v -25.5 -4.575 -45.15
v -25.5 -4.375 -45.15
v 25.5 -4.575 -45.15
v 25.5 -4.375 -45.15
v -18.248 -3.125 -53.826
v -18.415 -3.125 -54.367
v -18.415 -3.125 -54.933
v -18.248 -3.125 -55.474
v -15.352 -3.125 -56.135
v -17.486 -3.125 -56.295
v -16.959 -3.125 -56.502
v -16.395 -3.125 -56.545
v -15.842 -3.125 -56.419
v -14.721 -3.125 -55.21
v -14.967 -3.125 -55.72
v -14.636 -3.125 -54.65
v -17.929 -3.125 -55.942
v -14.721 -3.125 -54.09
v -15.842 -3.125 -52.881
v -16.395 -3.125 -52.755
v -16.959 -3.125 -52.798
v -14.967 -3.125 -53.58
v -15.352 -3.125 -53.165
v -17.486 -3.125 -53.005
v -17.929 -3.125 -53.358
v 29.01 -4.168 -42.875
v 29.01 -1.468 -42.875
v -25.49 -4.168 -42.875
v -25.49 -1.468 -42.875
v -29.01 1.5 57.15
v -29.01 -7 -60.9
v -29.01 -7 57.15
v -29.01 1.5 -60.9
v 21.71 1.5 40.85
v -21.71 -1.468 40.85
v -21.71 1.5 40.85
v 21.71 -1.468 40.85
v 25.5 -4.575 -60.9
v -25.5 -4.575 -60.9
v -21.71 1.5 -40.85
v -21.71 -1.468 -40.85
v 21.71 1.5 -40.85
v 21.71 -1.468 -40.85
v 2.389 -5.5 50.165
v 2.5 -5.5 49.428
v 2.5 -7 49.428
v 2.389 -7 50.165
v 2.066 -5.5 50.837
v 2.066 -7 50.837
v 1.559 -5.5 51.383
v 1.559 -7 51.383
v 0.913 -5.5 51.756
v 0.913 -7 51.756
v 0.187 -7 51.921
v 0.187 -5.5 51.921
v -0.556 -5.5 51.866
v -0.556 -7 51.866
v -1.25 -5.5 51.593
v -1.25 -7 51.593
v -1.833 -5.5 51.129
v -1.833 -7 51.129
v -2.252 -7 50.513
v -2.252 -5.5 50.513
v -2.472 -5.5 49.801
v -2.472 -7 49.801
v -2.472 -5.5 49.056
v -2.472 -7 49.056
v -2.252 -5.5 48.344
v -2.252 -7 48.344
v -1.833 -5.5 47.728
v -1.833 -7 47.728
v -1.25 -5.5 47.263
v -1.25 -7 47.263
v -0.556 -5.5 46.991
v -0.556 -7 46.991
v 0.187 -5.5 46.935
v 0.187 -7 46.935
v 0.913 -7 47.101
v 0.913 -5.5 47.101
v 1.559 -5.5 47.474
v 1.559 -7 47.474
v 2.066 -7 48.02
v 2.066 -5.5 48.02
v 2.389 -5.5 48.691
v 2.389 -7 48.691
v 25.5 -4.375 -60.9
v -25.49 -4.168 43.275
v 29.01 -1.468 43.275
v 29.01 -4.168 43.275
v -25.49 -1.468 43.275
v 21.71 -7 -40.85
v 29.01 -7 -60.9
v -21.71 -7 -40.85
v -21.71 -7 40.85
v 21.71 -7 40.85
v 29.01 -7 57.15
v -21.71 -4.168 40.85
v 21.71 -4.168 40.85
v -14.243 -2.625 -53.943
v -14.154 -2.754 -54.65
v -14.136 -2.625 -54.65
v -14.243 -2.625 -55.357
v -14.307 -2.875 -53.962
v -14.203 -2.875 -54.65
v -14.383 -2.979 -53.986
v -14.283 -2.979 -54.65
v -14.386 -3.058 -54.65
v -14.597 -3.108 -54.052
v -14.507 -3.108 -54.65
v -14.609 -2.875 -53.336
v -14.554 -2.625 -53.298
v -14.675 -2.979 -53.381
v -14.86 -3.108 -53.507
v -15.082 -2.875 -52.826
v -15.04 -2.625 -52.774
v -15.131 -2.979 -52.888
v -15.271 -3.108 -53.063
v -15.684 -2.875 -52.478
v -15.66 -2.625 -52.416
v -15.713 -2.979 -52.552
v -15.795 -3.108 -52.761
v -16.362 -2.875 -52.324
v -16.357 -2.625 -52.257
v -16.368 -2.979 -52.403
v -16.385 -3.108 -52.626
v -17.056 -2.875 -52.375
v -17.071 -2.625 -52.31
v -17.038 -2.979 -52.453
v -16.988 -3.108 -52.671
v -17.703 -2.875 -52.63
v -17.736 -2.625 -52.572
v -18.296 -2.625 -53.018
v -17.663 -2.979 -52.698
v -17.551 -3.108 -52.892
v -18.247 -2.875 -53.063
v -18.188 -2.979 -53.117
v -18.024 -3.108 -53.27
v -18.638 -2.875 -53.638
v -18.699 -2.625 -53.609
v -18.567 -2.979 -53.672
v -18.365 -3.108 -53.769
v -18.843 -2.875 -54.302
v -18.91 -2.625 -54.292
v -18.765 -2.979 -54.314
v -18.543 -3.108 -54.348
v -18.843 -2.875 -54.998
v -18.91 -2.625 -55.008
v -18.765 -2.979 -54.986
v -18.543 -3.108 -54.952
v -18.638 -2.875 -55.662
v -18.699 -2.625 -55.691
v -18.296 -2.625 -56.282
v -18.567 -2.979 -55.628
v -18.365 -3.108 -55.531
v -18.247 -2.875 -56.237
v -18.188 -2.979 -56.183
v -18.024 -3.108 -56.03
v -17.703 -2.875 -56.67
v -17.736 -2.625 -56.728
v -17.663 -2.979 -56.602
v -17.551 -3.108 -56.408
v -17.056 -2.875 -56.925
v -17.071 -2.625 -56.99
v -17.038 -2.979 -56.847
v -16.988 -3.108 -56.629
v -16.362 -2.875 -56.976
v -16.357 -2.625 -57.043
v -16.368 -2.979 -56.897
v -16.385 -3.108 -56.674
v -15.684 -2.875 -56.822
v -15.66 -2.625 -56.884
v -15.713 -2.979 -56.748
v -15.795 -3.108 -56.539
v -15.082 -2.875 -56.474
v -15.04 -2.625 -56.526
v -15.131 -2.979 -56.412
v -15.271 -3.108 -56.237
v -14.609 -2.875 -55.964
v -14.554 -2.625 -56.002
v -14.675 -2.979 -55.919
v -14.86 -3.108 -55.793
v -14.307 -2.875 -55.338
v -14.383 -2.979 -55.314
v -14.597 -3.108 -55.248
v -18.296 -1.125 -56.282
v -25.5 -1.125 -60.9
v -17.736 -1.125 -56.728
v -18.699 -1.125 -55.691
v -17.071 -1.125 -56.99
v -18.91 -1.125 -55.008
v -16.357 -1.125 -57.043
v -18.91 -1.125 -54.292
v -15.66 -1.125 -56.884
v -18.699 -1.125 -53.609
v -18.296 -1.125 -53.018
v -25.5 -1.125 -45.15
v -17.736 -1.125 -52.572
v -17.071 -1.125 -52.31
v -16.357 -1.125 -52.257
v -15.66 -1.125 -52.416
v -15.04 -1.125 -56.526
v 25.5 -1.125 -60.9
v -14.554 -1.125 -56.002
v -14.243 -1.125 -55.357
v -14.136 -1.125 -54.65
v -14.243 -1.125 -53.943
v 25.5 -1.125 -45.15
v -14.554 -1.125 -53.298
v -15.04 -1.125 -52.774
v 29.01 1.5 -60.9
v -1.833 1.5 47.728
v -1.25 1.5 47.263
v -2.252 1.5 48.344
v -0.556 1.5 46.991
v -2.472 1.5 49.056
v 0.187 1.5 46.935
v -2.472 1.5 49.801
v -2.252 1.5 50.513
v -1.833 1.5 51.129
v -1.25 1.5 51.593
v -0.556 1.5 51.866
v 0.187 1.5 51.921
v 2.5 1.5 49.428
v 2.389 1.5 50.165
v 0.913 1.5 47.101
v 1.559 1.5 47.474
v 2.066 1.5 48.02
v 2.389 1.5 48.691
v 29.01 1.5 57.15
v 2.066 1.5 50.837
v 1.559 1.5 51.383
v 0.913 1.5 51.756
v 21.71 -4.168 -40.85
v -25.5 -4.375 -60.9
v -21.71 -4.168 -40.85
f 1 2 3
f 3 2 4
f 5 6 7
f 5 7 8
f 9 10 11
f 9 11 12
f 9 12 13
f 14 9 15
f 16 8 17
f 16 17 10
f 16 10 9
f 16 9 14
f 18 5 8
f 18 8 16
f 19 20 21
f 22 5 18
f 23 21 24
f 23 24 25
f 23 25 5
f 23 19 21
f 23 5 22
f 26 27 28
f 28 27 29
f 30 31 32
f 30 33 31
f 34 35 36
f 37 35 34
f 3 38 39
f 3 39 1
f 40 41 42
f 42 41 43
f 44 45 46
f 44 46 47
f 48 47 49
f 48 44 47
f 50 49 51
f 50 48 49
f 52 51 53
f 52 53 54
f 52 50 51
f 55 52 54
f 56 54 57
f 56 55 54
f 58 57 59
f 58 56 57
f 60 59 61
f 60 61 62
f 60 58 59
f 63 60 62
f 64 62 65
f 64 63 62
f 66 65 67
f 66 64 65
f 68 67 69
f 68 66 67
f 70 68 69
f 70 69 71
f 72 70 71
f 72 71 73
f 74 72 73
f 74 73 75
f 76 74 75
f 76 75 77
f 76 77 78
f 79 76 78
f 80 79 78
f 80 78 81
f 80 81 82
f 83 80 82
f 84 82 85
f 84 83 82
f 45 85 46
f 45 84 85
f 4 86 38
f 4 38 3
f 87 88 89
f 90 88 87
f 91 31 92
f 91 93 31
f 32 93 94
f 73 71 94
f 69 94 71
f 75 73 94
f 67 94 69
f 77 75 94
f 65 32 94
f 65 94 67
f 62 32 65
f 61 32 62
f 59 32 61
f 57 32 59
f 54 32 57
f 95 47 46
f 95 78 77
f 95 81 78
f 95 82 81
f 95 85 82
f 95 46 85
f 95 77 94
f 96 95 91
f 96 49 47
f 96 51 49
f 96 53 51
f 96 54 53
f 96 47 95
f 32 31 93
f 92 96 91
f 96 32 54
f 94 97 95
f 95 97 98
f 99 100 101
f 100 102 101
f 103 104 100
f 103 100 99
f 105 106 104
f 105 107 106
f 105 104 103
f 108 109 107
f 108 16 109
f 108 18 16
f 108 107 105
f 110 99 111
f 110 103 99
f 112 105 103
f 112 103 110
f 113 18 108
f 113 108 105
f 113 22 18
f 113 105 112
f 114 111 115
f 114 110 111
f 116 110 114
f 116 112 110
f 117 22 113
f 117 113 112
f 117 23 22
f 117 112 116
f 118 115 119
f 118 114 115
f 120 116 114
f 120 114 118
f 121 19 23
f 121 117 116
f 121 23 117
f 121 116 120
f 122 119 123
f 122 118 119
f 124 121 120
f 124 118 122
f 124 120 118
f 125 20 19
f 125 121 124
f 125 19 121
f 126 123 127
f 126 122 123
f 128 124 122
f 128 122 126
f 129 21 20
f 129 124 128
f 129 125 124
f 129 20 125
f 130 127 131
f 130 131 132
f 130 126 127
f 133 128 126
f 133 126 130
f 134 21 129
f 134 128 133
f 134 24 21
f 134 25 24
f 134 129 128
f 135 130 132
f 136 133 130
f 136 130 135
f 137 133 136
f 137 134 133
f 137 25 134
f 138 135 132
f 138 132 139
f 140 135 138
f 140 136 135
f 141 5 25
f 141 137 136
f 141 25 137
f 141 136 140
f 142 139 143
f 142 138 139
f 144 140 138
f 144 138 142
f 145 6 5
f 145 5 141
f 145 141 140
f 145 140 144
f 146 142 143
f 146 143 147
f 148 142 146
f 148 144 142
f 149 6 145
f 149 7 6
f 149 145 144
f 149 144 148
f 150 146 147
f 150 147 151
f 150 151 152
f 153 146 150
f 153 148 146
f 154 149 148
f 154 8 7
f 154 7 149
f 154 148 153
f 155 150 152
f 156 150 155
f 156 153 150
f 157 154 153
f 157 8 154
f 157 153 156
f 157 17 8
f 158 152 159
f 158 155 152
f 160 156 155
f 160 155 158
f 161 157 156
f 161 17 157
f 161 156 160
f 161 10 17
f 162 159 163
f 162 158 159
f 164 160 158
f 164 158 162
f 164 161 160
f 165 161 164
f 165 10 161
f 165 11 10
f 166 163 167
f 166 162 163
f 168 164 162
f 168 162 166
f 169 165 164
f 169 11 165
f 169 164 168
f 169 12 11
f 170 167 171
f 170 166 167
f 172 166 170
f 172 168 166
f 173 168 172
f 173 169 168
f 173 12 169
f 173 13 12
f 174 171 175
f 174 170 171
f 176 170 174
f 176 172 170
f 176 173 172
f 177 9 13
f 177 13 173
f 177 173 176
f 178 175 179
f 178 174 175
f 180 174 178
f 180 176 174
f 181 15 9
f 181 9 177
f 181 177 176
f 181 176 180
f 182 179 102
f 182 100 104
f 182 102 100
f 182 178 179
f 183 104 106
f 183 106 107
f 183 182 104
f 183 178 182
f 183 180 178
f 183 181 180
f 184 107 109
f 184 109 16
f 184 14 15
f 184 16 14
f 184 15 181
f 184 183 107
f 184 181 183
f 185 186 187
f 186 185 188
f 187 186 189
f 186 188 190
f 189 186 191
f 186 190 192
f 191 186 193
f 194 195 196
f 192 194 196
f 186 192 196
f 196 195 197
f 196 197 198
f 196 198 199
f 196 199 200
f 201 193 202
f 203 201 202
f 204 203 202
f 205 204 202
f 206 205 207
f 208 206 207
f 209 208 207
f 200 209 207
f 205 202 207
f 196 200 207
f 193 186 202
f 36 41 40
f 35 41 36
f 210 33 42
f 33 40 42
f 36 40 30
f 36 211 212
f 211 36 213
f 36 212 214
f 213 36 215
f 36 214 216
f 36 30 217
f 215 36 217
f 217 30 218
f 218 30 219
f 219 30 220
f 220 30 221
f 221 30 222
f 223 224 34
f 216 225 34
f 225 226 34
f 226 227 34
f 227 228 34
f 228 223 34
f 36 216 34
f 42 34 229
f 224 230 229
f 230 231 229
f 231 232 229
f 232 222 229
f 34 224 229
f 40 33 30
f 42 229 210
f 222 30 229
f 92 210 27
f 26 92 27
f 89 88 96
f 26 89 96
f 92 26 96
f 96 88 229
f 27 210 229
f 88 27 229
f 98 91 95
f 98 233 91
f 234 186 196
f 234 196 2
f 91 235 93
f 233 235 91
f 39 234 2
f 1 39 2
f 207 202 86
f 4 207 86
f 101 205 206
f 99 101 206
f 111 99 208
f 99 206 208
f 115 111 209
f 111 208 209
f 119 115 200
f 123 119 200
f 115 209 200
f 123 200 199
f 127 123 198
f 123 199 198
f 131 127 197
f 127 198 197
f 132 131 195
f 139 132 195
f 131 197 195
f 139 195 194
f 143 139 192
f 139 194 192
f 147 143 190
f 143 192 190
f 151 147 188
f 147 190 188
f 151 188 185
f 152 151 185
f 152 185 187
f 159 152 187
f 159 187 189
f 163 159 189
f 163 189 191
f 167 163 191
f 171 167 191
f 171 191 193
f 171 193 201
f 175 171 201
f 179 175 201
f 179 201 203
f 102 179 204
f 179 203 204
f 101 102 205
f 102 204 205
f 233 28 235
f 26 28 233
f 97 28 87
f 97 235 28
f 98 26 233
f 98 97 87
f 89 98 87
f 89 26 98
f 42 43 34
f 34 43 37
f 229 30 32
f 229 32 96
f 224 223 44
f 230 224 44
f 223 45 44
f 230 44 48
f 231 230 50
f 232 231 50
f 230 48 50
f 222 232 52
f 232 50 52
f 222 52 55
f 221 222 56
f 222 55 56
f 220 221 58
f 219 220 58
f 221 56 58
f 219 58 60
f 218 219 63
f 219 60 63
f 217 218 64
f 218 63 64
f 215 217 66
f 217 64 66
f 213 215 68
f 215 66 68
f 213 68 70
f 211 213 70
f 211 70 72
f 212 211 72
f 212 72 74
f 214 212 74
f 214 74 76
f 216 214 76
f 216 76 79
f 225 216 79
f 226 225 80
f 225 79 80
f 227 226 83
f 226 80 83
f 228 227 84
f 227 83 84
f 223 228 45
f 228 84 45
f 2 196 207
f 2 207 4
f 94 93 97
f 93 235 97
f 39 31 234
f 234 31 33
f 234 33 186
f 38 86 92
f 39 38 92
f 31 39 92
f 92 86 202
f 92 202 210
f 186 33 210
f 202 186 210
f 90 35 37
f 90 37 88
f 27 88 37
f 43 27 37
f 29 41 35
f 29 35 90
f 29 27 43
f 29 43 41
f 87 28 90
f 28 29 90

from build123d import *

# Parameters (mm, degrees)
F0_W      = 58.02
F0_H      = 96.3
F1_DEPTH  = 5.5
F2_W      = 43.42
F2_H      = 81.7
F3_DEPTH  = 5.501
F4_W      = 2.4
F4_H      = 85.75
F5_DEPTH  = 54.5
F6_DEPTH  = 9
F7_R      = 2.5
F8_DEPTH  = 5.501
F9_DEPTH  = 16
F10_W     = 47
F10_H     = 3.25
F11_DEPTH = 19
F13_DEPTH = 0.4
F14_DEPTH = 3.25
F15_DEPTH = 2
F16_DEPTH = 2
F12_R     = 2.4
F17_DEPTH = 2
F18_R     = 0.5
F19_DEPTH = 0.3
F20_DEPTH = 1.5
F21_DEPTH = 1.5
F22_DEPTH = 0.2


with BuildPart() as f1:
    # F0 (on Front) → F1 (new body)
    with BuildSketch(Plane.XZ):
        Rectangle(F0_W, F0_H)
    extrude(amount=F1_DEPTH)

    # F2 (on face) → F3 (cut, through all)
    with BuildSketch(Plane.XZ.offset(5.5)):
        Rectangle(F2_W, F2_H)
    extrude(amount=-F3_DEPTH, mode=Mode.SUBTRACT)

    # F4 (on face) → F5 (cut)
    with BuildSketch(Plane.YZ.offset(29.01)):
        with Locations((-2.6675368889, 0)):
            Rectangle(F4_W, F4_H)
    extrude(amount=-F5_DEPTH, mode=Mode.SUBTRACT)

    # F6 (add): a face of the model
    f6_faces = [f1.faces().sort_by_distance(p)[0] for p in [
        (0, -2.75, 48.15),
    ]]
    extrude(f6_faces, amount=F6_DEPTH)

    # F7 (on face) → F8 (cut, through all)
    with BuildSketch(Plane.XZ.offset(5.5)):
        with Locations((0, 49.4283474982)):
            Circle(F7_R)
    extrude(amount=-F8_DEPTH, mode=Mode.SUBTRACT)

    # F9 (add): a face of the model
    f9_faces = [f1.faces().sort_by_distance(p)[0] for p in [
        (0, -2.75, -48.15),
    ]]
    extrude(f9_faces, amount=F9_DEPTH)

    # F10 (on face) → F11 (cut)
    with BuildSketch(Plane(origin=(0, 0, -64.15), x_dir=(1, 0, 0), z_dir=(0, 0, -1))):
        with Locations((0, 2.75)):
            Rectangle(F10_W, F10_H)
    extrude(amount=-F11_DEPTH, mode=Mode.SUBTRACT)

    # F13 (cut): a face of the model
    f13_faces = [f1.faces().sort_by_distance(p)[0] for p in [
        (1.76, -2.6675368889, 42.875),
    ]]
    extrude(f13_faces, amount=-F13_DEPTH, mode=Mode.SUBTRACT)

    # F14 (cut): a face of the model
    f14_faces = [f1.faces().sort_by_distance(p)[0] for p in [
        (-28.4271989705, -2.75, -64.15),
    ]]
    extrude(f14_faces, amount=-F14_DEPTH, mode=Mode.SUBTRACT)

    # F15 (cut): a face of the model
    f15_faces = [f1.faces().sort_by_distance(p)[0] for p in [
        (23.5, -2.75, -53.025),
    ]]
    extrude(f15_faces, amount=-F15_DEPTH, mode=Mode.SUBTRACT)

    # F16 (cut): a face of the model
    f16_faces = [f1.faces().sort_by_distance(p)[0] for p in [
        (-23.5, -2.75, -53.025),
    ]]
    extrude(f16_faces, amount=-F16_DEPTH, mode=Mode.SUBTRACT)

    # F12 (on face) → F17 (join)
    with BuildSketch(Plane.XZ.offset(1.125)):
        with Locations((-16.5364966542, -54.65)):
            Circle(F12_R)
    extrude(amount=F17_DEPTH)

    # F18
    f18_edges = [f1.edges().sort_by_distance(p)[0] for p in [
        (-18.936497, -3.125, -54.65),
    ]]
    fillet(f18_edges, radius=F18_R)

    # F19 (cut): a face of the model
    f19_faces = [f1.faces().sort_by_distance(p)[0] for p in [
        (27.990584849, -3.8675368889, 0.2),
    ]]
    extrude(f19_faces, amount=-F19_DEPTH, mode=Mode.SUBTRACT)

    # F20 (add): a face of the model
    f20_faces = [f1.faces().sort_by_distance(p)[0] for p in [
        (27.6946246581, 0, -1.875),
    ]]
    extrude(f20_faces, amount=F20_DEPTH)

    # F21 (add): a face of the model
    f21_faces = [f1.faces().sort_by_distance(p)[0] for p in [
        (27.6946246581, -5.5, -1.875),
    ]]
    extrude(f21_faces, amount=F21_DEPTH)

    # F22 (cut): a face of the model
    f22_faces = [f1.faces().sort_by_distance(p)[0] for p in [
        (0, -4.375, -53.025),
    ]]
    extrude(f22_faces, amount=-F22_DEPTH, mode=Mode.SUBTRACT)


solid = f1.part
